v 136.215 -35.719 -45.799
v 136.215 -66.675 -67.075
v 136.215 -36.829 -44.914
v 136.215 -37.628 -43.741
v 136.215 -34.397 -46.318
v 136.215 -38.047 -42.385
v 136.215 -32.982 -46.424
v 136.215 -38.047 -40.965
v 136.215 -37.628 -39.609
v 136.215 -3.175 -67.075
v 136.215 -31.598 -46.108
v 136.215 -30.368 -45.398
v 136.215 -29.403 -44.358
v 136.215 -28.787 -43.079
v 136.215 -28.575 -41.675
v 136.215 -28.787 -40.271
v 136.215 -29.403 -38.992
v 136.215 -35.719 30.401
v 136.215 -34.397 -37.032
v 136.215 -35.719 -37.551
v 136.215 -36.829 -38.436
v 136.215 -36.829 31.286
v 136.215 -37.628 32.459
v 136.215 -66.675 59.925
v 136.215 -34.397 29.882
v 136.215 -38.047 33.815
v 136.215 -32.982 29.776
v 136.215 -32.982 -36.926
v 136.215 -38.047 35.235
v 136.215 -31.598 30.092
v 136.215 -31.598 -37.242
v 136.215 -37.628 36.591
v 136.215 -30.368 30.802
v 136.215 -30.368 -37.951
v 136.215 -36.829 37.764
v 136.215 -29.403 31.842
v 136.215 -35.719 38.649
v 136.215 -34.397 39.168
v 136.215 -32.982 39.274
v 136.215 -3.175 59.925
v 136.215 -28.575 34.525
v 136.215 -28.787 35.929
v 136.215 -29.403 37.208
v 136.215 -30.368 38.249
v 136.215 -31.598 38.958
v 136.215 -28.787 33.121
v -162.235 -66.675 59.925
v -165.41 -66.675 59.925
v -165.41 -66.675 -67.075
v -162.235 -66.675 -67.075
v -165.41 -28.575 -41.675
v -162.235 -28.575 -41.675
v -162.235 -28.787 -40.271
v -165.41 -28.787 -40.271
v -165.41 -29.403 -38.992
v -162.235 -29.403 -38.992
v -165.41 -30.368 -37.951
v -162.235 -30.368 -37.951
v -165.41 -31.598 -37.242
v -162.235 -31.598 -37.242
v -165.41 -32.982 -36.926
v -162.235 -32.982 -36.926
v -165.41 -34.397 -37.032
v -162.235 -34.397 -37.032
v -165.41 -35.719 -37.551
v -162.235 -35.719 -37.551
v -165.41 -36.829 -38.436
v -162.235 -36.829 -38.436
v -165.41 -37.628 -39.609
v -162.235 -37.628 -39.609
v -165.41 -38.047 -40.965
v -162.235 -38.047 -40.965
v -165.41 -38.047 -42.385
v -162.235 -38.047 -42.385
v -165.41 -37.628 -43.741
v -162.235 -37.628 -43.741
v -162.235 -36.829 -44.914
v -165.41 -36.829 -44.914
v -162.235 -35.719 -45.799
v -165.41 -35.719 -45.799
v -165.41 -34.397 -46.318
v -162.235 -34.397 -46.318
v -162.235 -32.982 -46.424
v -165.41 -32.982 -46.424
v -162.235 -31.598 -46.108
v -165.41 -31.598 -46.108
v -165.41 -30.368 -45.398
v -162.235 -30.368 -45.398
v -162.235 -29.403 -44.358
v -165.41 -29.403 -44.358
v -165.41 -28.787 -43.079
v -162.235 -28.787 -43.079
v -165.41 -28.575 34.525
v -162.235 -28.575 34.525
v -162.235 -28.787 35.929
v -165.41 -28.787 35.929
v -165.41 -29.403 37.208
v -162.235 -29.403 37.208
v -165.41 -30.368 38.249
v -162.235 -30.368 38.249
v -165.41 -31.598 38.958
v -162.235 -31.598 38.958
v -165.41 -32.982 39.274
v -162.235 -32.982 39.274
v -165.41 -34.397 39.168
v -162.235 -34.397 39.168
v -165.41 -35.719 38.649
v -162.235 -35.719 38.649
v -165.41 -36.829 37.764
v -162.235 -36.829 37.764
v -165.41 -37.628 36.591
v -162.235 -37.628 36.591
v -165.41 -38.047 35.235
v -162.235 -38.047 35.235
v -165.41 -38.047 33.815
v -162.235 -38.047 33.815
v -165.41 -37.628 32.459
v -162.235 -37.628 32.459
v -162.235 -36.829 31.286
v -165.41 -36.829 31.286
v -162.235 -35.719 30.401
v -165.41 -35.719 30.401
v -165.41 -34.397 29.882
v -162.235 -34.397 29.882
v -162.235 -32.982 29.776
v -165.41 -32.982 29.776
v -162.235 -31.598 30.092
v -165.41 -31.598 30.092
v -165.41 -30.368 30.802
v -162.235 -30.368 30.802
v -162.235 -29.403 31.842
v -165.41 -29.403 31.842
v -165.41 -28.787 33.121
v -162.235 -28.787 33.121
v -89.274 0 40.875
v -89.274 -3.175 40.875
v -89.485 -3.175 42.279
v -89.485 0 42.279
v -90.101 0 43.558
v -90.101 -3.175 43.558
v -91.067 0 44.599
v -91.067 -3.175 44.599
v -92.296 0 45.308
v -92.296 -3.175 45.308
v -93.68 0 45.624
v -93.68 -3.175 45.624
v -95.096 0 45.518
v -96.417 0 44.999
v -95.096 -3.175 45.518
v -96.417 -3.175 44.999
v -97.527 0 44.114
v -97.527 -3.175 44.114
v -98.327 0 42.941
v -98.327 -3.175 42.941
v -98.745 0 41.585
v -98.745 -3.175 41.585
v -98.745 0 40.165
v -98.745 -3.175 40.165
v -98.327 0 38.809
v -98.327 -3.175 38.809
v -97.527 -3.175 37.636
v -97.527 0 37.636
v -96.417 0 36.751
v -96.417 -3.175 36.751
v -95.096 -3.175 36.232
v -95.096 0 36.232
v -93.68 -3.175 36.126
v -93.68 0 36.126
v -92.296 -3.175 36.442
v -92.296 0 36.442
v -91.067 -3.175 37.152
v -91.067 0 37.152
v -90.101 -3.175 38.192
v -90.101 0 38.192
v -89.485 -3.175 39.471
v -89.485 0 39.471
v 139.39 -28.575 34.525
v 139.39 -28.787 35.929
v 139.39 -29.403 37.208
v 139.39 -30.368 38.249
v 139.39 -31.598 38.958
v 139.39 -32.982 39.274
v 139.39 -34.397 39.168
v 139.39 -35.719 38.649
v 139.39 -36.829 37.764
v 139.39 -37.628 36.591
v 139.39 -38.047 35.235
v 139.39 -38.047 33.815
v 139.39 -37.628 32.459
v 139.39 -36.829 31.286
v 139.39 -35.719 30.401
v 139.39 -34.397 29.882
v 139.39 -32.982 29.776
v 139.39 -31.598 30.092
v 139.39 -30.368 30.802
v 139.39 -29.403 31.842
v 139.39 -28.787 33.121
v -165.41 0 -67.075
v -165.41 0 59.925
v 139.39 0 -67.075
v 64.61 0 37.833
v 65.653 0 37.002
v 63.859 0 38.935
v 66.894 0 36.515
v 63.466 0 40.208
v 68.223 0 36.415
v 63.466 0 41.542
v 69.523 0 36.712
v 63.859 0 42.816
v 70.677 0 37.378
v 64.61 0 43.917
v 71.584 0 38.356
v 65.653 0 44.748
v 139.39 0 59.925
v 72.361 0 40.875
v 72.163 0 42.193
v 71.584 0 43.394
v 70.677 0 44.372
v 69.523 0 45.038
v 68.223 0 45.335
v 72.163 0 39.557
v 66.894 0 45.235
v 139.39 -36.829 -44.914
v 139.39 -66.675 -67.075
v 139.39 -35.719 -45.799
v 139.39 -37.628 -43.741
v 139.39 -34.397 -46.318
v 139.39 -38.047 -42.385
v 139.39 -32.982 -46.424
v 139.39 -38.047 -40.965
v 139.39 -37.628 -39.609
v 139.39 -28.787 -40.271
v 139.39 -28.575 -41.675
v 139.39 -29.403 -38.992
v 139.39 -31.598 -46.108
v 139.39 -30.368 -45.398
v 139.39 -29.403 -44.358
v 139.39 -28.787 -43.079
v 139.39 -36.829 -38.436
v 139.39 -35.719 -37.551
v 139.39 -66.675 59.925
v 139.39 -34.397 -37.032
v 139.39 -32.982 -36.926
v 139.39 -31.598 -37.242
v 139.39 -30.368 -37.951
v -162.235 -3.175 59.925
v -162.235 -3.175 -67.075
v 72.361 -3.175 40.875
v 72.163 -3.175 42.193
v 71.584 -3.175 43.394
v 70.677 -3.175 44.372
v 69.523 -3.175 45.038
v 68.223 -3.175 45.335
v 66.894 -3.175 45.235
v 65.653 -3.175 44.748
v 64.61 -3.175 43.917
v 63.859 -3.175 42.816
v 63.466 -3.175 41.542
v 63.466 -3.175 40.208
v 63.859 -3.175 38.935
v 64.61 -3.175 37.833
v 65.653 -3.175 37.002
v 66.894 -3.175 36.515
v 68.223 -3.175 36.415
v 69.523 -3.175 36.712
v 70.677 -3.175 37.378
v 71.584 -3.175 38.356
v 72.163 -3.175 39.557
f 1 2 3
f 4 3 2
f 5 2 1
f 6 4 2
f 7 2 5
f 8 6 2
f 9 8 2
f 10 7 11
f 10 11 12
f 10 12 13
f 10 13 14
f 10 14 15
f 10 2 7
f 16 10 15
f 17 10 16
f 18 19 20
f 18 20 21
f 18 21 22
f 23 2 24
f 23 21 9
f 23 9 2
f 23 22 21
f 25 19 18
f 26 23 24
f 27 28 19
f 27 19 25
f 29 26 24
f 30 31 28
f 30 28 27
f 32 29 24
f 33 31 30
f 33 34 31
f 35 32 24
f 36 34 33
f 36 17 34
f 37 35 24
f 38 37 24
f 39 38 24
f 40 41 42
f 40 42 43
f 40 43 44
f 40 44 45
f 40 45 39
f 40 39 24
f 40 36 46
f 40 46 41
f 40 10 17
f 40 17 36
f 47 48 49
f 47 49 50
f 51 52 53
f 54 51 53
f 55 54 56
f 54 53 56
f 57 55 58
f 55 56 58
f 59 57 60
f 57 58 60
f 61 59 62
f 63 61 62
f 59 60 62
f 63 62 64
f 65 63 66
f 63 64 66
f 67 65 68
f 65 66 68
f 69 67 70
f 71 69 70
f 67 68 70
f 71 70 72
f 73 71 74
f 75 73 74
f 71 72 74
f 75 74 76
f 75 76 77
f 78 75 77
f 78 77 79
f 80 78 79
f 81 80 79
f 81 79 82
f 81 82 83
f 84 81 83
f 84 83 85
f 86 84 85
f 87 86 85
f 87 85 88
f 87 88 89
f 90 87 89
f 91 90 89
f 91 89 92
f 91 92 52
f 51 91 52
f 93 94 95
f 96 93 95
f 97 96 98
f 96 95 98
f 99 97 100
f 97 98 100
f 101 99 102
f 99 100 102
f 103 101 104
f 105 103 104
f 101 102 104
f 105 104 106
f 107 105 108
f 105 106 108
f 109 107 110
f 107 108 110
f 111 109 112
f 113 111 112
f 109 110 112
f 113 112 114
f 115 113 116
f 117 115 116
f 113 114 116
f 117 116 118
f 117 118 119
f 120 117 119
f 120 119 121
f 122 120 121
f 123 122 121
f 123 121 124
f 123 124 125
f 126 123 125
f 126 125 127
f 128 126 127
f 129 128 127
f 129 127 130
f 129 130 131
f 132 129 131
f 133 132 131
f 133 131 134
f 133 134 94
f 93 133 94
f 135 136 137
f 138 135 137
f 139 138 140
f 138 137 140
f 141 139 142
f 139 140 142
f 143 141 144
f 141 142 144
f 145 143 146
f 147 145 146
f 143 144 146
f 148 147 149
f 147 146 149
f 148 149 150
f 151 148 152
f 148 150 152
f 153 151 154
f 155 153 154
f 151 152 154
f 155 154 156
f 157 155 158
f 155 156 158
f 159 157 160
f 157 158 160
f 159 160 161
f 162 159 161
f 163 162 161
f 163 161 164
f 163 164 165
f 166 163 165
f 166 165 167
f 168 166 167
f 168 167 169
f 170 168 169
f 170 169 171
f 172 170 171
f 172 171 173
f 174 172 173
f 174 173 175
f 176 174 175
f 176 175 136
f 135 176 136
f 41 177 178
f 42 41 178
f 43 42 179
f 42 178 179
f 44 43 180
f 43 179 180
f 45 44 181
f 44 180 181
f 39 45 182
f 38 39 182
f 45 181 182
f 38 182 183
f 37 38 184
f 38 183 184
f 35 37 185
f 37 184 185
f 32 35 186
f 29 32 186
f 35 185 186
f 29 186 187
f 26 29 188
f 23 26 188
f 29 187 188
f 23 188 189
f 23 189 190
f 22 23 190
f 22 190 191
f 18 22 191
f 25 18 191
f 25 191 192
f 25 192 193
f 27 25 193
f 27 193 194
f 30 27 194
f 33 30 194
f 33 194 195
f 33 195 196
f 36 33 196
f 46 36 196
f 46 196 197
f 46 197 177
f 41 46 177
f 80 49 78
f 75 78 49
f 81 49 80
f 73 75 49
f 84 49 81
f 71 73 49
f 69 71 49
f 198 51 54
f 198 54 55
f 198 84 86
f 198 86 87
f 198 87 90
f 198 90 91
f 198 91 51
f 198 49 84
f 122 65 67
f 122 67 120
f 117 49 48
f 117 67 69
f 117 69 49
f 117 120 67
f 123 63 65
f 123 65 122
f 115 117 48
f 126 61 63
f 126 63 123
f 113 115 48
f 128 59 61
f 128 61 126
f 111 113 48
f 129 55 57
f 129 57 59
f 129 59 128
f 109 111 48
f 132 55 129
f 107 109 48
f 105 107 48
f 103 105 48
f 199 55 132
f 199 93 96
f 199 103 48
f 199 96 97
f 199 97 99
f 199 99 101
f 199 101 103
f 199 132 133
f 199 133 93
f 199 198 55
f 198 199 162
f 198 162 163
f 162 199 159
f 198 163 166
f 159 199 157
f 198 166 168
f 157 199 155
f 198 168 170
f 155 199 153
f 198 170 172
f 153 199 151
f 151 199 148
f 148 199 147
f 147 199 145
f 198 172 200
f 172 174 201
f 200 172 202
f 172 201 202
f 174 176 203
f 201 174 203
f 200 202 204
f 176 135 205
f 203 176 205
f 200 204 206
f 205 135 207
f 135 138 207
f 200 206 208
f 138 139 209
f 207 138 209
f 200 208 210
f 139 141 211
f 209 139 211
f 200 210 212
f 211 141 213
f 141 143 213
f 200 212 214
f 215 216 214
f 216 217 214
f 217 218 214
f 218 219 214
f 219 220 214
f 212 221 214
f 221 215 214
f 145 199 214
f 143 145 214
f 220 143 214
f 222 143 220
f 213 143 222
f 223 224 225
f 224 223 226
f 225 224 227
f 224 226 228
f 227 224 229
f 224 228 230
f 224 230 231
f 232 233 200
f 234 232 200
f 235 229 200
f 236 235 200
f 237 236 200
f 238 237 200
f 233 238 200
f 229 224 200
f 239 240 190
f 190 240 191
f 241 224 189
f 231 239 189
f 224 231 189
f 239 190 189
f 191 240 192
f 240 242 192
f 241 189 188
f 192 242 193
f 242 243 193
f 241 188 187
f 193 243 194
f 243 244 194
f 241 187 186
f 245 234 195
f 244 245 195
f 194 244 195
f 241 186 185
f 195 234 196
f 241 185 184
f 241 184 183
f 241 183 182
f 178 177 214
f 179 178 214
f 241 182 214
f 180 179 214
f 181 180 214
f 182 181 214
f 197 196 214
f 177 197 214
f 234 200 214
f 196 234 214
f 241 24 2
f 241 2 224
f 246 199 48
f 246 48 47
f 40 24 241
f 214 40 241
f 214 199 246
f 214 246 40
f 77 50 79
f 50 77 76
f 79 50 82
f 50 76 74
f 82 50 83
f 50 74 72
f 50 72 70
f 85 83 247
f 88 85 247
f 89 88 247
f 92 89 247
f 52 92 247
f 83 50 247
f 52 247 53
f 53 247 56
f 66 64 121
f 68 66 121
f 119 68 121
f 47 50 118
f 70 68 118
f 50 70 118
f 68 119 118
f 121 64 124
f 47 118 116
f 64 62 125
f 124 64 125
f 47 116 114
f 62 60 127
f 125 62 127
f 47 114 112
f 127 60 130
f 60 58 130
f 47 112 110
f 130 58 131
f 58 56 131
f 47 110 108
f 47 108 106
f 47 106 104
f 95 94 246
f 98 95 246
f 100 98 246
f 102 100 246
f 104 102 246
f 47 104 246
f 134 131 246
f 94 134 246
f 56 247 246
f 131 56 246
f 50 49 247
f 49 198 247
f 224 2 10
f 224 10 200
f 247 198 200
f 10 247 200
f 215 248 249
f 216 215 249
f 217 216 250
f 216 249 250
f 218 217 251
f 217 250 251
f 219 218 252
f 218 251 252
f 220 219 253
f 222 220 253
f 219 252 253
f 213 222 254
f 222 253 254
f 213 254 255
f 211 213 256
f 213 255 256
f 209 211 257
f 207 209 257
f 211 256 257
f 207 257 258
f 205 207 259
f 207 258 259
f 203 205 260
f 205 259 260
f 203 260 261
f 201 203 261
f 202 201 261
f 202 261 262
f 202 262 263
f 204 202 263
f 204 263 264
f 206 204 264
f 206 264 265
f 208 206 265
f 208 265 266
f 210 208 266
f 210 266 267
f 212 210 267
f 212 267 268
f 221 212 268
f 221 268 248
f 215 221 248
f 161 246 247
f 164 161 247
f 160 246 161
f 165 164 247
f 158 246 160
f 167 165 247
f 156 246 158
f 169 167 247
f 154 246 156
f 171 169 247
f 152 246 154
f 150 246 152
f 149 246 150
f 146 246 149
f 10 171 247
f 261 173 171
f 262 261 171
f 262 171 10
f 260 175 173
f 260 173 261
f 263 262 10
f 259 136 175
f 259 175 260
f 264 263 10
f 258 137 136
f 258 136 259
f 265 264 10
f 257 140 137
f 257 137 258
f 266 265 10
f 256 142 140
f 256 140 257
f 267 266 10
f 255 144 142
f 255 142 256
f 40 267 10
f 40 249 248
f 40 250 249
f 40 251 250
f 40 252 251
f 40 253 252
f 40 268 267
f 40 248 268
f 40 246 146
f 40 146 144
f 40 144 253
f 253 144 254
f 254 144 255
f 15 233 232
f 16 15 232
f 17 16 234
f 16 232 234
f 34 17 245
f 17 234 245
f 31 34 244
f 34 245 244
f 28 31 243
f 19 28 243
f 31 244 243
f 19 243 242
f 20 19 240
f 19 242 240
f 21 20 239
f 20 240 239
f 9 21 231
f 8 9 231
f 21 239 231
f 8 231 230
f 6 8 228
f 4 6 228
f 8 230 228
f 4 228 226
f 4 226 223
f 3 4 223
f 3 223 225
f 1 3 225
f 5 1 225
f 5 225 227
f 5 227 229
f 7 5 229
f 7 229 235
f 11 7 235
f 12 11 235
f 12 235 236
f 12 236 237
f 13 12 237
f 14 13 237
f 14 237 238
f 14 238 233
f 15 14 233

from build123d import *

# Parameters (mm, degrees)
F0_W     = 304.8
F0_H     = 127
F1_DEPTH = 3.175
F2_W     = 3.175
F2_H     = 127
F3_DEPTH = 63.5
F4_R     = 4.7625
F4_R_2   = 4.47244
F5_DEPTH = 25.4
F6_R     = 4.7625
F7_DEPTH = 304.8


with BuildPart() as f1:
    # F0 (on Front) → F1 (new body)
    with BuildSketch(Plane.XZ):
        with Locations((-13.010172, -3.574955)):
            Rectangle(F0_W, F0_H)
    extrude(amount=F1_DEPTH)

    # F2 (on face) → F3 (join)
    with BuildSketch(Plane.XZ.offset(3.175)):
        with Locations((-163.822672, -3.574955)):
            Rectangle(F2_W, F2_H)
        with Locations((137.802328, -3.574955)):
            Rectangle(F2_W, F2_H)
    extrude(amount=F3_DEPTH)

    # F4 (on face) → F5 (cut)
    with BuildSketch(Plane.XZ.offset(3.175)):
        with Locations((-94.036172, 40.875045)):
            Circle(F4_R)
        with Locations((67.888828, 40.875045)):
            Circle(F4_R_2)
    extrude(amount=-F5_DEPTH, mode=Mode.SUBTRACT)

    # F6 (on face) → F7 (cut)
    with BuildSketch(Plane.YZ.offset(139.389828)):
        with Locations((-33.3375, 34.525045)):
            Circle(F6_R)
        with Locations((-33.3375, -41.674955)):
            Circle(F6_R)
    extrude(amount=-F7_DEPTH, mode=Mode.SUBTRACT)


solid = f1.part
